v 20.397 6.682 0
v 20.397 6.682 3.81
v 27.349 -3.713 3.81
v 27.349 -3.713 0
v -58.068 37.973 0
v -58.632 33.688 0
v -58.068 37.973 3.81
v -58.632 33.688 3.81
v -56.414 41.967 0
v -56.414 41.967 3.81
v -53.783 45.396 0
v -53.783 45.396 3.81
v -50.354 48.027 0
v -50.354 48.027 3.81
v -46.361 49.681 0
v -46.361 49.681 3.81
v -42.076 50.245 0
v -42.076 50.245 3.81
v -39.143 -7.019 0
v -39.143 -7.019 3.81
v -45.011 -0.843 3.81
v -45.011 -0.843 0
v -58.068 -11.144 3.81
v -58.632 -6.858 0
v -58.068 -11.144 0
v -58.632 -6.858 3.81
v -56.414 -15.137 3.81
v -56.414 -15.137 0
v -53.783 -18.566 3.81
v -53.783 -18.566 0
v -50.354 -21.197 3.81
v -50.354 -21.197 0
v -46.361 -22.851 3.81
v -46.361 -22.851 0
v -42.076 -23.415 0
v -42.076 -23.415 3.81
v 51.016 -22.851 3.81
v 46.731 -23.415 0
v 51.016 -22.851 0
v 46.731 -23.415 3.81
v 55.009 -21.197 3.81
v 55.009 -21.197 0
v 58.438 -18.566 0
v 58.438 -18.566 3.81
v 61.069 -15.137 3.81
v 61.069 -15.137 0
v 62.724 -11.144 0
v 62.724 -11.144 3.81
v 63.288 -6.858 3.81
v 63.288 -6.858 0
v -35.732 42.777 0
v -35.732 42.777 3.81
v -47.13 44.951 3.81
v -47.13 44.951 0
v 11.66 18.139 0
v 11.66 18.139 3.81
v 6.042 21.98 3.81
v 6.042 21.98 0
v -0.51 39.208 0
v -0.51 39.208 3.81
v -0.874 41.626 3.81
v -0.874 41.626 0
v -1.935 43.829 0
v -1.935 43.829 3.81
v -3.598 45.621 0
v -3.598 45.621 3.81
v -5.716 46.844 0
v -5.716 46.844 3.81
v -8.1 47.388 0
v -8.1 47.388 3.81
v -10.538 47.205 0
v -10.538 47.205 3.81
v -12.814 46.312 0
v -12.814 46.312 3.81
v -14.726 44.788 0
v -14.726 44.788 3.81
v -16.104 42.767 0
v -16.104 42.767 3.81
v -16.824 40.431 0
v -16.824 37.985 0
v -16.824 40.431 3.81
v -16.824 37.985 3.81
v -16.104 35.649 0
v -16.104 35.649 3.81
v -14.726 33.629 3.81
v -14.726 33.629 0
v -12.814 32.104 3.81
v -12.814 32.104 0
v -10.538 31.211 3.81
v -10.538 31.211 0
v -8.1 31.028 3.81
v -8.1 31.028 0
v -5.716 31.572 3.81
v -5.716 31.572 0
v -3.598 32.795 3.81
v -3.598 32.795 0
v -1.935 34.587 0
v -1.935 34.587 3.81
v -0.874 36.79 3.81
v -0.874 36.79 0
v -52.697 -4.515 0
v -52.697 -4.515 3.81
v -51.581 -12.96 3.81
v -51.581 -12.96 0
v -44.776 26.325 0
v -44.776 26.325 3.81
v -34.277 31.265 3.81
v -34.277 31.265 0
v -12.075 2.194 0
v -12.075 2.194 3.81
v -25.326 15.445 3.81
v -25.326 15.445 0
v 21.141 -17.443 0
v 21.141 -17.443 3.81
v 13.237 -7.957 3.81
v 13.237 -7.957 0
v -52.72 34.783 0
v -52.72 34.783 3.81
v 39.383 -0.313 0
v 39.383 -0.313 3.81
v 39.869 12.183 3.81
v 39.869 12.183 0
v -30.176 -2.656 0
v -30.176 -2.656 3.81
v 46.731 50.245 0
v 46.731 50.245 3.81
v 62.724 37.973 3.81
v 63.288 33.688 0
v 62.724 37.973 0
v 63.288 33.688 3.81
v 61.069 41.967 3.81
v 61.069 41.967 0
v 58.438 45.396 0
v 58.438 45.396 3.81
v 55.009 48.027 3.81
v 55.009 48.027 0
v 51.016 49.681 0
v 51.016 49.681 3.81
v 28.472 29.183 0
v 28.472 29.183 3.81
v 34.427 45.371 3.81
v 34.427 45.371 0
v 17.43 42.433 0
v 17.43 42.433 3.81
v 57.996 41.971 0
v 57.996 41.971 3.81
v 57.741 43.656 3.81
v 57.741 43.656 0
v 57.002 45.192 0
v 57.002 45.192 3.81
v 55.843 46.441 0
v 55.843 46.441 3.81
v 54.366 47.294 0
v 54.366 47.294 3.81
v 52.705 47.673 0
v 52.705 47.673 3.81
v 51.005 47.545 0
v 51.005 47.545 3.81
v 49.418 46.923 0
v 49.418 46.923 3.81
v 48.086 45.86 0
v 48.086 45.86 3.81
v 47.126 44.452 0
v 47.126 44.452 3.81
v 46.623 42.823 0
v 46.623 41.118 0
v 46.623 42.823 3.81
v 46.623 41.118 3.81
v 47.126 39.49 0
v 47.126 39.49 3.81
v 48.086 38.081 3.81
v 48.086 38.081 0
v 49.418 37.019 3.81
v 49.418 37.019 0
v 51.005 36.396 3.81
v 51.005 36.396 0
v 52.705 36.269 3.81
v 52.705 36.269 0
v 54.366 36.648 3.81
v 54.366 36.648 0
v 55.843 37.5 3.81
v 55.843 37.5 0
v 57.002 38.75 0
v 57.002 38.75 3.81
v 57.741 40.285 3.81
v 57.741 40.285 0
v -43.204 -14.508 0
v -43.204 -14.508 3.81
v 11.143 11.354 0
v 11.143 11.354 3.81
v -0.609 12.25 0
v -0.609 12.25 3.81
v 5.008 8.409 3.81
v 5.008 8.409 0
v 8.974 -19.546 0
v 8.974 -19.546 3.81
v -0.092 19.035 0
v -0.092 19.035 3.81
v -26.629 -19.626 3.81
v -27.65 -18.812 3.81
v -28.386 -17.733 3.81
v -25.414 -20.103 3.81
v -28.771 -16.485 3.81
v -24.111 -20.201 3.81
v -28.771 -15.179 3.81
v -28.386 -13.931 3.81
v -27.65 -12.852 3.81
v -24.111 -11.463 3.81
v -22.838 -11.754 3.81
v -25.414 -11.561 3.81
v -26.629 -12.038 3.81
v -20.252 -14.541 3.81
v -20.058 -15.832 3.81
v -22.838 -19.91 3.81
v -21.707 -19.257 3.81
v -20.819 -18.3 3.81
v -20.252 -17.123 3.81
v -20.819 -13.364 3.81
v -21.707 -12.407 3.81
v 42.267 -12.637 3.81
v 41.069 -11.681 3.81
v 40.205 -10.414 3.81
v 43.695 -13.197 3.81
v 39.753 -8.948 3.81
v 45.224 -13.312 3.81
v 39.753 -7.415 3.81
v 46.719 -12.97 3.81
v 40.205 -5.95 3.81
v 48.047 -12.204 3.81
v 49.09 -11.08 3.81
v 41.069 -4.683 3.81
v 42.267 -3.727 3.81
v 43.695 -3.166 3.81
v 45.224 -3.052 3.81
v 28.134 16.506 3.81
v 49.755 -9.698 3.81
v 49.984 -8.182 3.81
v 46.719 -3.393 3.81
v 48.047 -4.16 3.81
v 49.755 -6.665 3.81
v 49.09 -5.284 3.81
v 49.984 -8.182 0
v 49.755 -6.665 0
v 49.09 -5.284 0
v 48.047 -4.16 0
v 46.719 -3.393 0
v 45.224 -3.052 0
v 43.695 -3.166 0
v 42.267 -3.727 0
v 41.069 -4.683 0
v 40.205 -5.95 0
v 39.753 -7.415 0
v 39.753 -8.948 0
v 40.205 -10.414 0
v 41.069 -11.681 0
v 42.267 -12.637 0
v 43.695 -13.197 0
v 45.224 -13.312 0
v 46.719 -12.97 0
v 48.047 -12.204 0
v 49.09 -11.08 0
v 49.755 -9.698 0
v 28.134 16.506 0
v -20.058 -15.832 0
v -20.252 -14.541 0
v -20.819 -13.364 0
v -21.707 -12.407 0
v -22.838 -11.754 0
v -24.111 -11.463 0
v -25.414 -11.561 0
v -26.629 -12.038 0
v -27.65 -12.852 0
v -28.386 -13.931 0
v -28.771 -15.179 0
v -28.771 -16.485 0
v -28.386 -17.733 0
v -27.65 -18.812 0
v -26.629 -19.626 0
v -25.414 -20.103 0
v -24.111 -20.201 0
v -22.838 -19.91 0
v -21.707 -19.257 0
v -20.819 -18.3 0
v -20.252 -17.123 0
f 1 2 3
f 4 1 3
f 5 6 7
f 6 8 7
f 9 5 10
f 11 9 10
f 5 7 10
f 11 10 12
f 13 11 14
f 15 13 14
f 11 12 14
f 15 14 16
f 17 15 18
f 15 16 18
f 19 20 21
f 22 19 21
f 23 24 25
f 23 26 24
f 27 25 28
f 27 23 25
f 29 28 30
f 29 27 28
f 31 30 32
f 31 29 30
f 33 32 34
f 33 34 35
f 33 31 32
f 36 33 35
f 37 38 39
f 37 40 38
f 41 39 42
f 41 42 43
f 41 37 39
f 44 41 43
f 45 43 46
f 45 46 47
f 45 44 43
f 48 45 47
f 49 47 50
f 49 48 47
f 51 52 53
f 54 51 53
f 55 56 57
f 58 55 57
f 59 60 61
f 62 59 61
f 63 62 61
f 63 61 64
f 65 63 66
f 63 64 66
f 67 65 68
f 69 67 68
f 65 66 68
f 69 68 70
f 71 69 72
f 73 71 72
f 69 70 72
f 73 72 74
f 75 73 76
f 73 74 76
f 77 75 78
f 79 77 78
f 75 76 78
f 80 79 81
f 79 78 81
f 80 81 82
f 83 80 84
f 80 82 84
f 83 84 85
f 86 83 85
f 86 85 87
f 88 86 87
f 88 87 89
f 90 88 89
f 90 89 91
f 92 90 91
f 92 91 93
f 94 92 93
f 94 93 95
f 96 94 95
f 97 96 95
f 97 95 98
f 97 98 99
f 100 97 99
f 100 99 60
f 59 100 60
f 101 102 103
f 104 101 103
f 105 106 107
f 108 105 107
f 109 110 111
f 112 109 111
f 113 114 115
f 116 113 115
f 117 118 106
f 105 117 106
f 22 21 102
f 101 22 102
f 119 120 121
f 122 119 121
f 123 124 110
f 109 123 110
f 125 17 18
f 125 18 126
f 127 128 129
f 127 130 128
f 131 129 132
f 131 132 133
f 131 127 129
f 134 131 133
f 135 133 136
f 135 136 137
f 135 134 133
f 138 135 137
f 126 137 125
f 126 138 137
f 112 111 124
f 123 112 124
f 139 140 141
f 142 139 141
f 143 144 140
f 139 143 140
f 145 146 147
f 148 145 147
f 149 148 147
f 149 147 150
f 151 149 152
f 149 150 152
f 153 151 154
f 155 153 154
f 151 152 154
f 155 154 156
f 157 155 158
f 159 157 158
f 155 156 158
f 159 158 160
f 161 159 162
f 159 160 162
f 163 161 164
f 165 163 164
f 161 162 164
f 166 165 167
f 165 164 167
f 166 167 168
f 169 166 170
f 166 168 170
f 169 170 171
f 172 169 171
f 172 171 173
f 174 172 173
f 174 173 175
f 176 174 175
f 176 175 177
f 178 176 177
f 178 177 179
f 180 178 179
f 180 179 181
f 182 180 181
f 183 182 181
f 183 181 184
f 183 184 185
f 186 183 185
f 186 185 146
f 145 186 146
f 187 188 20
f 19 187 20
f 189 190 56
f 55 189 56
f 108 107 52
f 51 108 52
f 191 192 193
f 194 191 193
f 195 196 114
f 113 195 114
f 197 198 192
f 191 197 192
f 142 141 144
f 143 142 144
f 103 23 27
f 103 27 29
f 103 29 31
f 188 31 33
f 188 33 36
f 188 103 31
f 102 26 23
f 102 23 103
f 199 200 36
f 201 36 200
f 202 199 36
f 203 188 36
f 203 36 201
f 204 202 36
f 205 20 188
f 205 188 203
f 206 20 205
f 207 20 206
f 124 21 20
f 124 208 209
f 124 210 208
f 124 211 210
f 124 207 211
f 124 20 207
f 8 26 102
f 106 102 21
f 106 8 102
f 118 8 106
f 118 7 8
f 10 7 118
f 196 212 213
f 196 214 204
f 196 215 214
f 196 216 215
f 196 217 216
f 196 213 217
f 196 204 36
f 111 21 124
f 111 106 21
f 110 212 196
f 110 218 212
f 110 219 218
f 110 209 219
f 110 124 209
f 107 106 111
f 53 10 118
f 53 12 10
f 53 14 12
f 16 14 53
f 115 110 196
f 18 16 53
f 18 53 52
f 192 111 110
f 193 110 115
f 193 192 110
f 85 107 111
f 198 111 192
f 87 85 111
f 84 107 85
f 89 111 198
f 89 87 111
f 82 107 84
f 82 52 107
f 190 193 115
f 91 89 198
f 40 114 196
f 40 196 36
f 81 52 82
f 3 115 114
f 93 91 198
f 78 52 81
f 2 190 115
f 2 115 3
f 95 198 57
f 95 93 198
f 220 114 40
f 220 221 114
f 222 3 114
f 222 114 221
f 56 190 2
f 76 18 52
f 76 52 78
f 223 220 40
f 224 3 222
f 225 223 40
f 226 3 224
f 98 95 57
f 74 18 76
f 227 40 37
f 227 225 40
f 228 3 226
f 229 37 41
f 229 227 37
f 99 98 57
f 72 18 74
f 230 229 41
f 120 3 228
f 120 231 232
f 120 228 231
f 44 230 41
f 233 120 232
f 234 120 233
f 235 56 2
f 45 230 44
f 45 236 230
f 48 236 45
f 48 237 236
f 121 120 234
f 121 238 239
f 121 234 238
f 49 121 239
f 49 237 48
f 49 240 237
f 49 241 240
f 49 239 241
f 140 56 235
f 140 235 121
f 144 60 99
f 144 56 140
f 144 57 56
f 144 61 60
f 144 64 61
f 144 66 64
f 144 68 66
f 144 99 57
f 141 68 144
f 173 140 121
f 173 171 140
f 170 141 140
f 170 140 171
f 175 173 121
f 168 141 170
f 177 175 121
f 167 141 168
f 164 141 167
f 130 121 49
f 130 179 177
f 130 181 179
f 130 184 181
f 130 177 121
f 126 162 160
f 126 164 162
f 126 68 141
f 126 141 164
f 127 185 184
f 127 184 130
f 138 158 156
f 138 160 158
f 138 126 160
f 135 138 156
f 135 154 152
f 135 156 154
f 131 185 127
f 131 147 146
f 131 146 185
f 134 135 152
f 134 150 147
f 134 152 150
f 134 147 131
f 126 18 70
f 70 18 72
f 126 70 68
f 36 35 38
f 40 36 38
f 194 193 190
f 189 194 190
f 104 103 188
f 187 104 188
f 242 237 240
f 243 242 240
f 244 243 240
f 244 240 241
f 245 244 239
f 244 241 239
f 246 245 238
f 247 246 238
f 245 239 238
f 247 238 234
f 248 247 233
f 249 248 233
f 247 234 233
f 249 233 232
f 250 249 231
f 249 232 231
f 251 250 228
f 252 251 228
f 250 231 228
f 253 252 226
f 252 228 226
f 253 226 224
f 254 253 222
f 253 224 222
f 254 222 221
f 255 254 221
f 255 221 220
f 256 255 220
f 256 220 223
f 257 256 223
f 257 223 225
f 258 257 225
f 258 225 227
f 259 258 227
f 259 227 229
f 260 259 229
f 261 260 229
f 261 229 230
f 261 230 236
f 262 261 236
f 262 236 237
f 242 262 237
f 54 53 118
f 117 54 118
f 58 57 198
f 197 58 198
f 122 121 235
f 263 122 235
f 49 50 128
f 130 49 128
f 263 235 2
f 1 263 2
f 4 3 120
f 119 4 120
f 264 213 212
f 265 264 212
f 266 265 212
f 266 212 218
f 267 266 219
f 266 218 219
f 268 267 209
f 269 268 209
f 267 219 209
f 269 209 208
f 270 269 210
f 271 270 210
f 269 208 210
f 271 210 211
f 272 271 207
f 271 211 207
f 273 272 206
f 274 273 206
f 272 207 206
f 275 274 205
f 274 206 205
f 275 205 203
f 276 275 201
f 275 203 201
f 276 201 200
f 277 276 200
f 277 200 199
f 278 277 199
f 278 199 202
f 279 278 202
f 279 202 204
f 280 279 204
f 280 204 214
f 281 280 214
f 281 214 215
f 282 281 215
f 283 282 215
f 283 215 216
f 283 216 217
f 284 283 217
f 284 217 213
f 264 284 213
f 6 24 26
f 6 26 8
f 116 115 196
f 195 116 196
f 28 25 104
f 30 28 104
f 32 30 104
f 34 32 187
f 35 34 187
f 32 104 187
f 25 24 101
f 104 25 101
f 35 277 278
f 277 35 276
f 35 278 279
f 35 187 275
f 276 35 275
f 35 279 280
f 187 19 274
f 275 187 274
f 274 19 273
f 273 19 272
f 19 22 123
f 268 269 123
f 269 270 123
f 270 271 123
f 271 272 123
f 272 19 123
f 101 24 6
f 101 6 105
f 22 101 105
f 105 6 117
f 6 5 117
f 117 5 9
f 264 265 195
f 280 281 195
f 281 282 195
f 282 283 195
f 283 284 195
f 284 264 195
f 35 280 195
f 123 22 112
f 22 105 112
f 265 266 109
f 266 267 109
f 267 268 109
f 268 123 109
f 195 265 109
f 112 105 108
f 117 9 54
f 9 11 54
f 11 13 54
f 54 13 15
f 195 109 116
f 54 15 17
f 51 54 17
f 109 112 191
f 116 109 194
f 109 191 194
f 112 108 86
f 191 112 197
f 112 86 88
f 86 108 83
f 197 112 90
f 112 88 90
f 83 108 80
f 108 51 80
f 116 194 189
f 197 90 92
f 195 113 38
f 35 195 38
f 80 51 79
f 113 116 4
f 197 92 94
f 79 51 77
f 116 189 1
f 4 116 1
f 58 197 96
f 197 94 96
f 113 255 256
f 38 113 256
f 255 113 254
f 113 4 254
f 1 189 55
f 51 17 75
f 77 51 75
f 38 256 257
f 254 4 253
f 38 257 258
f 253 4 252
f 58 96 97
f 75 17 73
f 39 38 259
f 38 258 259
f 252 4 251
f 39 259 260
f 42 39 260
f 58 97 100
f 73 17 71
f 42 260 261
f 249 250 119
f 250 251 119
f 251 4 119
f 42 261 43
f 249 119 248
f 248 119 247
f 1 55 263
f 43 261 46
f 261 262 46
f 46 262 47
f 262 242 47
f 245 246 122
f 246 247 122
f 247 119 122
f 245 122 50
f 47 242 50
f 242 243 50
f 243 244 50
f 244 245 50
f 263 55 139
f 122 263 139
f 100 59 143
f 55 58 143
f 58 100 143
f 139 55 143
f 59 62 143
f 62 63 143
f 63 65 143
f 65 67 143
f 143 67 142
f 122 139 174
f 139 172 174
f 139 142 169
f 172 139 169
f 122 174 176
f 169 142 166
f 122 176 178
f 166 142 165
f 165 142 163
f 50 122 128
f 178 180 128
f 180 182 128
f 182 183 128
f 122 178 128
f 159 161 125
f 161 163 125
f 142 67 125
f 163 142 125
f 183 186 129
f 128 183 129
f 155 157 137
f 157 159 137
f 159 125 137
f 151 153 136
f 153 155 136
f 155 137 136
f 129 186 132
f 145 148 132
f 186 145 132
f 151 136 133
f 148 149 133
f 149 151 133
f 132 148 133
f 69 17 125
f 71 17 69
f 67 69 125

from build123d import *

# Parameters (mm, degrees)
F0_W     = 121.92
F0_H     = 73.66
F1_DEPTH = 3.81
F2_R     = 16.556677
F3_R     = 8.202995
F3_R_2   = 5.144325
F3_R_3   = 4.381005
F3_R_4   = 5.718053
F4_DEPTH = 3.811


with BuildPart() as f1:
    # F0 (on Top) → F1 (new body)
    with BuildSketch(Plane.XY):
        with Locations((2.327671, 13.414853)):
            Rectangle(F0_W, F0_H)
    extrude(amount=F1_DEPTH)

    # F2
    f2_edges = [f1.edges().sort_by_distance(p)[0] for p in [
        (-58.632329, -23.415147, 1.905),
        (63.287671, -23.415147, 1.905),
        (63.287671, 50.244853, 1.905),
        (-58.632329, 50.244853, 1.905),
    ]]
    fillet(f2_edges, radius=F2_R)

    # F3 (on face) → F4 (cut, through all)
    with BuildSketch(Plane.XY.offset(3.81)):
        Polygon((-44.776369, 26.324741), (-34.277338, 31.26546), (-35.731862, 42.777398), (-47.129838, 44.951449), (-52.719651, 34.783147), align=None)
        Polygon((39.868699, 12.182859), (28.134486, 16.505987), (20.396876, 6.682008), (27.348982, -3.712673), (39.38323, -0.31296), align=None)
        Polygon((-39.143418, -7.019384), (-45.010525, -0.843484), (-52.697191, -4.514976), (-51.580704, -12.959983), (-43.204012, -14.507793), align=None)
        with Locations((-8.712908, 39.208088)):
            Circle(F3_R)
        with Locations((44.839598, -8.181633)):
            Circle(F3_R_2)
        with Locations((-24.438646, -15.831992)):
            Circle(F3_R_3)
        with Locations((52.277453, 41.970715)):
            Circle(F3_R_4)
        Polygon((-12.075472, 2.19376), (-25.326282, 15.444567), (-30.176412, -2.656374), align=None)
        Polygon((17.429908, 42.43333), (28.472248, 29.18253), (34.426607, 45.370877), align=None)
        Polygon((21.141237, -17.442858), (13.236605, -7.957305), (8.974191, -19.545694), align=None)
        Polygon((6.042457, 21.979525), (-0.092179, 19.034901), (-0.609377, 12.249838), (5.00806, 8.4094), (11.142695, 11.354025), (11.659894, 18.139087), align=None)
    extrude(amount=-F4_DEPTH, mode=Mode.SUBTRACT)


solid = f1.part
